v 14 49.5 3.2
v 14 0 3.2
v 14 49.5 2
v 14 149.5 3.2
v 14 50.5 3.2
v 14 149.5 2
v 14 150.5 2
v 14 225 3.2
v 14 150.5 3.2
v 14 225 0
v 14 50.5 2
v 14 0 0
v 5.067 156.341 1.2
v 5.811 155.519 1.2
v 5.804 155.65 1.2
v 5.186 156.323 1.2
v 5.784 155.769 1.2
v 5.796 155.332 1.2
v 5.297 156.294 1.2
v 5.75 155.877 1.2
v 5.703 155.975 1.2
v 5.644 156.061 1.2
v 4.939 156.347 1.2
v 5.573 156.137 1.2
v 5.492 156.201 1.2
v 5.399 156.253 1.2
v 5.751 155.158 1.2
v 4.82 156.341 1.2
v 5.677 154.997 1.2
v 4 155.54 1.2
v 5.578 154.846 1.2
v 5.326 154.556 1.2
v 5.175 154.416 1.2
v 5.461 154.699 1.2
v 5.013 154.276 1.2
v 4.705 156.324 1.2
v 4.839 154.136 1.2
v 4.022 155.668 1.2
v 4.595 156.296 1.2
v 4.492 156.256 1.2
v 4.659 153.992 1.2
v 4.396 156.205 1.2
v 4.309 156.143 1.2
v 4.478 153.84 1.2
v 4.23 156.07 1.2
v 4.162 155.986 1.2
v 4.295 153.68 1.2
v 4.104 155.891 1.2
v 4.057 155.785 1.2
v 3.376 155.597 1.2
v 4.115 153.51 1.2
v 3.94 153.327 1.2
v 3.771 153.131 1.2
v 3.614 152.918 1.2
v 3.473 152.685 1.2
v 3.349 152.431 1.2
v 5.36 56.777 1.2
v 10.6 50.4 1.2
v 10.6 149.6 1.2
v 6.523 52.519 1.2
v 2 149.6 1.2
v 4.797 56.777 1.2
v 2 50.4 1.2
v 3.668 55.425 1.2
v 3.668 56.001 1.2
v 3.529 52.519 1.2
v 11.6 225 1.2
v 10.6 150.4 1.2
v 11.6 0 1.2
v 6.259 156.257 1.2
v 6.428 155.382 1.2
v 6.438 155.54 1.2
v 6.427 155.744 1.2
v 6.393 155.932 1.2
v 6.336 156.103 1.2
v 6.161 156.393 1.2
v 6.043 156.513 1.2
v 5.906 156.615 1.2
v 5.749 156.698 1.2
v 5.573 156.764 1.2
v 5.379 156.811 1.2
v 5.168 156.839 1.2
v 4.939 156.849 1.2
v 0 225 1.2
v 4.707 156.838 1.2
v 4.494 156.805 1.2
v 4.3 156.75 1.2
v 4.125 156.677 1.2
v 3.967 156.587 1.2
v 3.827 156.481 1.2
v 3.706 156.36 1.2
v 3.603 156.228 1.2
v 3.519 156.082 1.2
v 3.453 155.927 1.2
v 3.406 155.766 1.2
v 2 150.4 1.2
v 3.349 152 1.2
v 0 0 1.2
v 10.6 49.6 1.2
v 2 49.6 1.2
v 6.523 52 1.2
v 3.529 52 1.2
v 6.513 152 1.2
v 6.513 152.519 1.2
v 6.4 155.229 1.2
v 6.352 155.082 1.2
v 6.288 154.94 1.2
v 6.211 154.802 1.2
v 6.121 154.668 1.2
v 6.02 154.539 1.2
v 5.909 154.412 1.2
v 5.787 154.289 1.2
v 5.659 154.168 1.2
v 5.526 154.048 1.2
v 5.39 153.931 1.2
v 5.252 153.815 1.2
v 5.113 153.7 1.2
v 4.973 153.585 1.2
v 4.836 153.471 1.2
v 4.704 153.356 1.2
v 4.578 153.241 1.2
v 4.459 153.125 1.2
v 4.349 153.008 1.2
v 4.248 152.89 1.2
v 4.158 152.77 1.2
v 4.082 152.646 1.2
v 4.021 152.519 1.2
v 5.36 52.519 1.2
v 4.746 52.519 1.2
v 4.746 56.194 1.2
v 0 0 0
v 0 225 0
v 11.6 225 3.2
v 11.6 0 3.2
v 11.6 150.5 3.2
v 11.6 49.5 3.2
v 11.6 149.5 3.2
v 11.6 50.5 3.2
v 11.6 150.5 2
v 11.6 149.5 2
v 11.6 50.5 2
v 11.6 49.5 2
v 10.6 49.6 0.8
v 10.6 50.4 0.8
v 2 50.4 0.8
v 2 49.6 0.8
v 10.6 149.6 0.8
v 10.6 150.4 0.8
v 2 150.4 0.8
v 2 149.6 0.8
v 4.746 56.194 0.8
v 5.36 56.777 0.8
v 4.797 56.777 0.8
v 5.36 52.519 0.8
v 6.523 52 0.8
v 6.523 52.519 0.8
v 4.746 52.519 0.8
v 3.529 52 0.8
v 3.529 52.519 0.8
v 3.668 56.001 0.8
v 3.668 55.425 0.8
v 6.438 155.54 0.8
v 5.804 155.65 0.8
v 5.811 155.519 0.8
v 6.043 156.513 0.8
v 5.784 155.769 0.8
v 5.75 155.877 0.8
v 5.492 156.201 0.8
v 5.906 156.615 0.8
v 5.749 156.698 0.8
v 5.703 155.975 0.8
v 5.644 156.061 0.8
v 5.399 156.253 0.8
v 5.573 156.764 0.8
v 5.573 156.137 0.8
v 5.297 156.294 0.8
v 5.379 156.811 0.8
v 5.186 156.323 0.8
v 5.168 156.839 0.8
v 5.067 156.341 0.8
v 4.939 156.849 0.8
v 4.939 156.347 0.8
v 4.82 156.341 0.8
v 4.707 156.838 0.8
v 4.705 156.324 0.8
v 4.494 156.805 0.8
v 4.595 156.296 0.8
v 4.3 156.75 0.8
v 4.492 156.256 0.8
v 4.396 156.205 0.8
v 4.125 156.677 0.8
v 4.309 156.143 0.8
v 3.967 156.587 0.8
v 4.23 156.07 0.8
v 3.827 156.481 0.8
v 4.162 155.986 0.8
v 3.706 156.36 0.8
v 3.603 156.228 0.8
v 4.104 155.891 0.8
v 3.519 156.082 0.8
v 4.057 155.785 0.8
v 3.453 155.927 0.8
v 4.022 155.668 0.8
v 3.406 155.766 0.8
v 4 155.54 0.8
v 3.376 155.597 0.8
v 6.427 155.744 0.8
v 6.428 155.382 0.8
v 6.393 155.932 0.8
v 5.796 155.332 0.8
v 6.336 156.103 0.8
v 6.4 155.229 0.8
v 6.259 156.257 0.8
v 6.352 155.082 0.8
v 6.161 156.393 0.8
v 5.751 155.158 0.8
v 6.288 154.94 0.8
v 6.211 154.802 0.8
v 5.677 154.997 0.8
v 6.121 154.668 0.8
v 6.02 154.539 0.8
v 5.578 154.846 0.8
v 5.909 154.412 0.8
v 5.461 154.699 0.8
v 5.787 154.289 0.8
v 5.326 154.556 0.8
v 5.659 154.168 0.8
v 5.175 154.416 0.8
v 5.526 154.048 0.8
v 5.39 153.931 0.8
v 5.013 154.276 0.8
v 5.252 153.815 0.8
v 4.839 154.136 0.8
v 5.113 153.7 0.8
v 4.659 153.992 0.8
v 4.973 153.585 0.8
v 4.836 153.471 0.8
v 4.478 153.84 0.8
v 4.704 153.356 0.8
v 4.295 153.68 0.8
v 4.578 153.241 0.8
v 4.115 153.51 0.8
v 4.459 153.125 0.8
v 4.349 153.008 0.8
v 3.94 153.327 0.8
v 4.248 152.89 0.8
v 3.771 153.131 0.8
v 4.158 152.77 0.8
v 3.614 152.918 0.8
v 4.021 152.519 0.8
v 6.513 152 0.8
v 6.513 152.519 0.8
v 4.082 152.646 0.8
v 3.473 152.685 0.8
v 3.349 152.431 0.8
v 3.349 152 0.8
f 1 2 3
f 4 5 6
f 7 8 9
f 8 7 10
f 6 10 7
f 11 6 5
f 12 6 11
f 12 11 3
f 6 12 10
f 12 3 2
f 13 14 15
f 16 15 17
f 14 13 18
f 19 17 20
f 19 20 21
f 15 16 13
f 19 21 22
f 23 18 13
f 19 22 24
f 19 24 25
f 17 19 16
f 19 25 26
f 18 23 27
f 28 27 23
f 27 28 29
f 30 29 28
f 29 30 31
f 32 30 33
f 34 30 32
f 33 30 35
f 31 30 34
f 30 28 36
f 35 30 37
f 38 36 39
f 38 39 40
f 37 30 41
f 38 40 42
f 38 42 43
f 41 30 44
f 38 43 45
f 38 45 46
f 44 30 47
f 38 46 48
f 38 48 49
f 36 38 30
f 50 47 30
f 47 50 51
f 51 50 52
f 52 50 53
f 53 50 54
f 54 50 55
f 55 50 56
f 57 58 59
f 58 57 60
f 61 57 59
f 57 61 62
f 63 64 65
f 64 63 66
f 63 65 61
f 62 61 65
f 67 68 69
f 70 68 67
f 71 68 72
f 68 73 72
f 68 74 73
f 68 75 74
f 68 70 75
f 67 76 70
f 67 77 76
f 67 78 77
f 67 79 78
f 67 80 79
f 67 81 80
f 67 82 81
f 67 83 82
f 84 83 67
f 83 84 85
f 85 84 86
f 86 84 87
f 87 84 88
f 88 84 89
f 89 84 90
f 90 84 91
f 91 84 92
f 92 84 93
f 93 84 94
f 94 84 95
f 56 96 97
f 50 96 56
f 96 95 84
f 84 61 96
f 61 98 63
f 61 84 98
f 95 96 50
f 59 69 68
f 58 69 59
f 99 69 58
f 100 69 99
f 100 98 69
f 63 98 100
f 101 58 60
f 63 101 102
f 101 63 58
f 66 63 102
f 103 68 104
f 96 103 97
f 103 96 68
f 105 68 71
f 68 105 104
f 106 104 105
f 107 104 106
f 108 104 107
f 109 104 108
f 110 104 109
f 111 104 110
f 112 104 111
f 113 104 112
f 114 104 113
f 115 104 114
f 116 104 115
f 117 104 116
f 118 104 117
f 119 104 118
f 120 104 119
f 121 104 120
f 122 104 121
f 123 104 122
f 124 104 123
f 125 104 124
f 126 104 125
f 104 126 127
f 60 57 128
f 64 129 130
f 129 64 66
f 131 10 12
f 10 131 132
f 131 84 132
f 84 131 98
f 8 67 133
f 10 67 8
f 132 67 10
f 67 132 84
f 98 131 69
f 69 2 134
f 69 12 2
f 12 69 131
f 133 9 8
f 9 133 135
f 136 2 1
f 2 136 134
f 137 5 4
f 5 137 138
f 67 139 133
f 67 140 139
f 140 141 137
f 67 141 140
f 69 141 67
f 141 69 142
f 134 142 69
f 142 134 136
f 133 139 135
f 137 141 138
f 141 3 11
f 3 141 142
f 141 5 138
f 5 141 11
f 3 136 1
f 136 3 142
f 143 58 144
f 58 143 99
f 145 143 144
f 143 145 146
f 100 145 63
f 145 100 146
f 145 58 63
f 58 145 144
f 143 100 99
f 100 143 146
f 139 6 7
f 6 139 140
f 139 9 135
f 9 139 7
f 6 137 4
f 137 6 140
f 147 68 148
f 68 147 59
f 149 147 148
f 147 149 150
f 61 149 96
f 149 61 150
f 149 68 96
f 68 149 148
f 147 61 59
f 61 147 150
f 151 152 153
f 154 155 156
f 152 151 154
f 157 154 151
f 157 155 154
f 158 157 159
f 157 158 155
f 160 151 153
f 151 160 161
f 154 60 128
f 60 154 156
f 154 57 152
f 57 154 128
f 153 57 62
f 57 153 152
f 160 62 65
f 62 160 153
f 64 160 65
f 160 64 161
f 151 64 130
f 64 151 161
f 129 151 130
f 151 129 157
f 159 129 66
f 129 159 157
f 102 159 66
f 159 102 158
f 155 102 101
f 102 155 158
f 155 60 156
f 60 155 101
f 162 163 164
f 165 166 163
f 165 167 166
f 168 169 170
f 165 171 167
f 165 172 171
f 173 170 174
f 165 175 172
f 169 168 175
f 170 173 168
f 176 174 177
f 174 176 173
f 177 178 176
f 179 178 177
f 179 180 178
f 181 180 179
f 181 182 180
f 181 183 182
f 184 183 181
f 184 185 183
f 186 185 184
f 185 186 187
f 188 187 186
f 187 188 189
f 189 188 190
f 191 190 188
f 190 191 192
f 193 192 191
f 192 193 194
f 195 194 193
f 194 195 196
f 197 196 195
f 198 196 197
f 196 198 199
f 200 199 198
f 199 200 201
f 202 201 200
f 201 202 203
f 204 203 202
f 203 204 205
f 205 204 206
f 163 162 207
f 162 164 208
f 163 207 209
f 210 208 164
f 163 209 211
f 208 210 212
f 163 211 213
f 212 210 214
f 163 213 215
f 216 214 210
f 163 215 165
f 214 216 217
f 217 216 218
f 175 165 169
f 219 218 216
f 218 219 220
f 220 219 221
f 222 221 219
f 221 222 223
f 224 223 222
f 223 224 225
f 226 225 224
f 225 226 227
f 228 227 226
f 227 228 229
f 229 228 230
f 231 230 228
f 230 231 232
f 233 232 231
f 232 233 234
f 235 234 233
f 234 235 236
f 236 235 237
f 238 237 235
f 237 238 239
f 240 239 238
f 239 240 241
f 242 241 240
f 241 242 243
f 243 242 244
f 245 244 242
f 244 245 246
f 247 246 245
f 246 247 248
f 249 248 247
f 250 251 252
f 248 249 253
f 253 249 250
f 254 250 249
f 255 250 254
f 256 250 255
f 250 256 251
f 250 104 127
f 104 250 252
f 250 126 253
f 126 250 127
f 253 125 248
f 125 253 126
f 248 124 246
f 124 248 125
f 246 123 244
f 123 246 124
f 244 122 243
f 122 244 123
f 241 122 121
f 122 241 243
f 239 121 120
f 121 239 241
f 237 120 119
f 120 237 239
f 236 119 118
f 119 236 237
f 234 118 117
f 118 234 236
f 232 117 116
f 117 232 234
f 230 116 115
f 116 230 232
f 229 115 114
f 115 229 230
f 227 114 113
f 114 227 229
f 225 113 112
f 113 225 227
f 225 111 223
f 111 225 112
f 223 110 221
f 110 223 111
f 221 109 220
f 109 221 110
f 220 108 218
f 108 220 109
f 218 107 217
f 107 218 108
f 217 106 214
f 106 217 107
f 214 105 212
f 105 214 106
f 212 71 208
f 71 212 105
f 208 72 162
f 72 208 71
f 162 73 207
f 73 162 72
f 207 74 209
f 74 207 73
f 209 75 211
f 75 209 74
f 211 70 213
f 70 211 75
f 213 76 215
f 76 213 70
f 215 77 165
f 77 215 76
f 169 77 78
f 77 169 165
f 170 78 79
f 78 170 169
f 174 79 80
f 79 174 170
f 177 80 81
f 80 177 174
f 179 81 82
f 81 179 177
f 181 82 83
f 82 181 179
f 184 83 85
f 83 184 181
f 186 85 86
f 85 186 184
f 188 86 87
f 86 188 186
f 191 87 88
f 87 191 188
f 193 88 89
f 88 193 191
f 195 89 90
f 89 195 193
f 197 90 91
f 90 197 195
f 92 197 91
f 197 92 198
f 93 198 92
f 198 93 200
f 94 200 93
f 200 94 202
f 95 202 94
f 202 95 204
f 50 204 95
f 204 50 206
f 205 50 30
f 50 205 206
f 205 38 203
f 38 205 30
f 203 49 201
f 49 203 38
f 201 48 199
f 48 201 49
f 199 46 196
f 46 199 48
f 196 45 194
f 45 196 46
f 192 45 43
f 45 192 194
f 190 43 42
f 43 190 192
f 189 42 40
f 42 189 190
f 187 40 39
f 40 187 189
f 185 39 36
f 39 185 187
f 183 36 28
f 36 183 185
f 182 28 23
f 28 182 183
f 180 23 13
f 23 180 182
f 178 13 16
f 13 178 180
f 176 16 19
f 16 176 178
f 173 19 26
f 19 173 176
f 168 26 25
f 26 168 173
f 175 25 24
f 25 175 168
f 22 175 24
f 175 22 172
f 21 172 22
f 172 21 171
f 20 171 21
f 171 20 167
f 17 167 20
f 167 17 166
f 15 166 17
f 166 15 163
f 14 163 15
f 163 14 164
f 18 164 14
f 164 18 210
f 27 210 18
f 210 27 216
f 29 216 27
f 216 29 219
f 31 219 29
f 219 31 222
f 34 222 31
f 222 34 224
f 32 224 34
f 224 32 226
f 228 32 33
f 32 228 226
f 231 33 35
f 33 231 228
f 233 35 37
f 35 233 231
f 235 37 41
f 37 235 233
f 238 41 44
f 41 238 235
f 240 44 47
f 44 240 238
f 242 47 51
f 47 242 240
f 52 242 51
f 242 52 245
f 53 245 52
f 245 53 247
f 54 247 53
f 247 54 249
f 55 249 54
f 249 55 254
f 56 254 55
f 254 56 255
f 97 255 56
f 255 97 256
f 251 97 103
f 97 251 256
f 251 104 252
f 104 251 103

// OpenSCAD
// Papierführung für A4 in zwei Abschnitten (Handschrift-Plotter, Artillery Genius Pro)
//
// Eine Leiste, die mit Klebeband links auf das Bett geklebt wird (parallel zur Y-Richtung).
// Das Blatt liegt mit der linken Kante an der Lippe → X bleibt beim Verschieben gleich.
// Zwei Kerben markieren, wo die OBERKANTE des Blatts liegt:
//   Kerbe 1 = Abschnitt 1 (obere Blatthälfte wird geschrieben)
//   Kerbe 2 = Abschnitt 2, genau `versatz` mm weiter hinten
//
// Ausrichtung beim Aufkleben: Kerbe 1 zeigt nach vorn (zum Display), Kerbe 2 nach hinten.
// Druck: flach, Lippe nach oben, PLA, 0,2 mm Schicht, keine Stützen.

laenge     = 225;   // passt auf die 230-mm-Platte
breite     = 14;    // Auflagefläche (wird aufgeklebt)
dicke      = 1.2;   // flach, damit der Stift nicht anstößt
lippe_h    = 2.0;   // Höhe der Anschlaglippe über der Auflage (Papier ~0,1 mm)
lippe_b    = 2.4;
versatz    = 100;   // muss zum Versatz im G-Code passen (pause_test.gcode: 100 mm)
kerbe_1    = 50;    // Abstand der ersten Kerbe vom vorderen Ende
kerbe_b    = 1.0;   // Breite der Kerbe
kerbe_t    = 1.2;   // Tiefe der Kerbe in die Lippe

module kerbe(y) {
    // Schlitz durch die Lippe + Strich quer über die Auflage
    translate([breite - lippe_b - 0.1, y - kerbe_b / 2, dicke + lippe_h - kerbe_t])
        cube([lippe_b + 0.2, kerbe_b, kerbe_t + 0.1]);
    translate([2, y - 0.4, dicke - 0.4])
        cube([breite - lippe_b - 3, 0.8, 0.5]);
}

module ziffer(t, y) {
    translate([3, y + 2, dicke - 0.4])
        linear_extrude(0.5) text(t, size = 5, halign = "left");
}

difference() {
    union() {
        cube([breite, laenge, dicke]);                                  // Auflage
        translate([breite - lippe_b, 0, 0]) cube([lippe_b, laenge, dicke + lippe_h]); // Lippe rechts → Blatt liegt rechts davon
    }
    kerbe(kerbe_1);
    kerbe(kerbe_1 + versatz);
    ziffer("1", kerbe_1);
    ziffer("2", kerbe_1 + versatz);
}
